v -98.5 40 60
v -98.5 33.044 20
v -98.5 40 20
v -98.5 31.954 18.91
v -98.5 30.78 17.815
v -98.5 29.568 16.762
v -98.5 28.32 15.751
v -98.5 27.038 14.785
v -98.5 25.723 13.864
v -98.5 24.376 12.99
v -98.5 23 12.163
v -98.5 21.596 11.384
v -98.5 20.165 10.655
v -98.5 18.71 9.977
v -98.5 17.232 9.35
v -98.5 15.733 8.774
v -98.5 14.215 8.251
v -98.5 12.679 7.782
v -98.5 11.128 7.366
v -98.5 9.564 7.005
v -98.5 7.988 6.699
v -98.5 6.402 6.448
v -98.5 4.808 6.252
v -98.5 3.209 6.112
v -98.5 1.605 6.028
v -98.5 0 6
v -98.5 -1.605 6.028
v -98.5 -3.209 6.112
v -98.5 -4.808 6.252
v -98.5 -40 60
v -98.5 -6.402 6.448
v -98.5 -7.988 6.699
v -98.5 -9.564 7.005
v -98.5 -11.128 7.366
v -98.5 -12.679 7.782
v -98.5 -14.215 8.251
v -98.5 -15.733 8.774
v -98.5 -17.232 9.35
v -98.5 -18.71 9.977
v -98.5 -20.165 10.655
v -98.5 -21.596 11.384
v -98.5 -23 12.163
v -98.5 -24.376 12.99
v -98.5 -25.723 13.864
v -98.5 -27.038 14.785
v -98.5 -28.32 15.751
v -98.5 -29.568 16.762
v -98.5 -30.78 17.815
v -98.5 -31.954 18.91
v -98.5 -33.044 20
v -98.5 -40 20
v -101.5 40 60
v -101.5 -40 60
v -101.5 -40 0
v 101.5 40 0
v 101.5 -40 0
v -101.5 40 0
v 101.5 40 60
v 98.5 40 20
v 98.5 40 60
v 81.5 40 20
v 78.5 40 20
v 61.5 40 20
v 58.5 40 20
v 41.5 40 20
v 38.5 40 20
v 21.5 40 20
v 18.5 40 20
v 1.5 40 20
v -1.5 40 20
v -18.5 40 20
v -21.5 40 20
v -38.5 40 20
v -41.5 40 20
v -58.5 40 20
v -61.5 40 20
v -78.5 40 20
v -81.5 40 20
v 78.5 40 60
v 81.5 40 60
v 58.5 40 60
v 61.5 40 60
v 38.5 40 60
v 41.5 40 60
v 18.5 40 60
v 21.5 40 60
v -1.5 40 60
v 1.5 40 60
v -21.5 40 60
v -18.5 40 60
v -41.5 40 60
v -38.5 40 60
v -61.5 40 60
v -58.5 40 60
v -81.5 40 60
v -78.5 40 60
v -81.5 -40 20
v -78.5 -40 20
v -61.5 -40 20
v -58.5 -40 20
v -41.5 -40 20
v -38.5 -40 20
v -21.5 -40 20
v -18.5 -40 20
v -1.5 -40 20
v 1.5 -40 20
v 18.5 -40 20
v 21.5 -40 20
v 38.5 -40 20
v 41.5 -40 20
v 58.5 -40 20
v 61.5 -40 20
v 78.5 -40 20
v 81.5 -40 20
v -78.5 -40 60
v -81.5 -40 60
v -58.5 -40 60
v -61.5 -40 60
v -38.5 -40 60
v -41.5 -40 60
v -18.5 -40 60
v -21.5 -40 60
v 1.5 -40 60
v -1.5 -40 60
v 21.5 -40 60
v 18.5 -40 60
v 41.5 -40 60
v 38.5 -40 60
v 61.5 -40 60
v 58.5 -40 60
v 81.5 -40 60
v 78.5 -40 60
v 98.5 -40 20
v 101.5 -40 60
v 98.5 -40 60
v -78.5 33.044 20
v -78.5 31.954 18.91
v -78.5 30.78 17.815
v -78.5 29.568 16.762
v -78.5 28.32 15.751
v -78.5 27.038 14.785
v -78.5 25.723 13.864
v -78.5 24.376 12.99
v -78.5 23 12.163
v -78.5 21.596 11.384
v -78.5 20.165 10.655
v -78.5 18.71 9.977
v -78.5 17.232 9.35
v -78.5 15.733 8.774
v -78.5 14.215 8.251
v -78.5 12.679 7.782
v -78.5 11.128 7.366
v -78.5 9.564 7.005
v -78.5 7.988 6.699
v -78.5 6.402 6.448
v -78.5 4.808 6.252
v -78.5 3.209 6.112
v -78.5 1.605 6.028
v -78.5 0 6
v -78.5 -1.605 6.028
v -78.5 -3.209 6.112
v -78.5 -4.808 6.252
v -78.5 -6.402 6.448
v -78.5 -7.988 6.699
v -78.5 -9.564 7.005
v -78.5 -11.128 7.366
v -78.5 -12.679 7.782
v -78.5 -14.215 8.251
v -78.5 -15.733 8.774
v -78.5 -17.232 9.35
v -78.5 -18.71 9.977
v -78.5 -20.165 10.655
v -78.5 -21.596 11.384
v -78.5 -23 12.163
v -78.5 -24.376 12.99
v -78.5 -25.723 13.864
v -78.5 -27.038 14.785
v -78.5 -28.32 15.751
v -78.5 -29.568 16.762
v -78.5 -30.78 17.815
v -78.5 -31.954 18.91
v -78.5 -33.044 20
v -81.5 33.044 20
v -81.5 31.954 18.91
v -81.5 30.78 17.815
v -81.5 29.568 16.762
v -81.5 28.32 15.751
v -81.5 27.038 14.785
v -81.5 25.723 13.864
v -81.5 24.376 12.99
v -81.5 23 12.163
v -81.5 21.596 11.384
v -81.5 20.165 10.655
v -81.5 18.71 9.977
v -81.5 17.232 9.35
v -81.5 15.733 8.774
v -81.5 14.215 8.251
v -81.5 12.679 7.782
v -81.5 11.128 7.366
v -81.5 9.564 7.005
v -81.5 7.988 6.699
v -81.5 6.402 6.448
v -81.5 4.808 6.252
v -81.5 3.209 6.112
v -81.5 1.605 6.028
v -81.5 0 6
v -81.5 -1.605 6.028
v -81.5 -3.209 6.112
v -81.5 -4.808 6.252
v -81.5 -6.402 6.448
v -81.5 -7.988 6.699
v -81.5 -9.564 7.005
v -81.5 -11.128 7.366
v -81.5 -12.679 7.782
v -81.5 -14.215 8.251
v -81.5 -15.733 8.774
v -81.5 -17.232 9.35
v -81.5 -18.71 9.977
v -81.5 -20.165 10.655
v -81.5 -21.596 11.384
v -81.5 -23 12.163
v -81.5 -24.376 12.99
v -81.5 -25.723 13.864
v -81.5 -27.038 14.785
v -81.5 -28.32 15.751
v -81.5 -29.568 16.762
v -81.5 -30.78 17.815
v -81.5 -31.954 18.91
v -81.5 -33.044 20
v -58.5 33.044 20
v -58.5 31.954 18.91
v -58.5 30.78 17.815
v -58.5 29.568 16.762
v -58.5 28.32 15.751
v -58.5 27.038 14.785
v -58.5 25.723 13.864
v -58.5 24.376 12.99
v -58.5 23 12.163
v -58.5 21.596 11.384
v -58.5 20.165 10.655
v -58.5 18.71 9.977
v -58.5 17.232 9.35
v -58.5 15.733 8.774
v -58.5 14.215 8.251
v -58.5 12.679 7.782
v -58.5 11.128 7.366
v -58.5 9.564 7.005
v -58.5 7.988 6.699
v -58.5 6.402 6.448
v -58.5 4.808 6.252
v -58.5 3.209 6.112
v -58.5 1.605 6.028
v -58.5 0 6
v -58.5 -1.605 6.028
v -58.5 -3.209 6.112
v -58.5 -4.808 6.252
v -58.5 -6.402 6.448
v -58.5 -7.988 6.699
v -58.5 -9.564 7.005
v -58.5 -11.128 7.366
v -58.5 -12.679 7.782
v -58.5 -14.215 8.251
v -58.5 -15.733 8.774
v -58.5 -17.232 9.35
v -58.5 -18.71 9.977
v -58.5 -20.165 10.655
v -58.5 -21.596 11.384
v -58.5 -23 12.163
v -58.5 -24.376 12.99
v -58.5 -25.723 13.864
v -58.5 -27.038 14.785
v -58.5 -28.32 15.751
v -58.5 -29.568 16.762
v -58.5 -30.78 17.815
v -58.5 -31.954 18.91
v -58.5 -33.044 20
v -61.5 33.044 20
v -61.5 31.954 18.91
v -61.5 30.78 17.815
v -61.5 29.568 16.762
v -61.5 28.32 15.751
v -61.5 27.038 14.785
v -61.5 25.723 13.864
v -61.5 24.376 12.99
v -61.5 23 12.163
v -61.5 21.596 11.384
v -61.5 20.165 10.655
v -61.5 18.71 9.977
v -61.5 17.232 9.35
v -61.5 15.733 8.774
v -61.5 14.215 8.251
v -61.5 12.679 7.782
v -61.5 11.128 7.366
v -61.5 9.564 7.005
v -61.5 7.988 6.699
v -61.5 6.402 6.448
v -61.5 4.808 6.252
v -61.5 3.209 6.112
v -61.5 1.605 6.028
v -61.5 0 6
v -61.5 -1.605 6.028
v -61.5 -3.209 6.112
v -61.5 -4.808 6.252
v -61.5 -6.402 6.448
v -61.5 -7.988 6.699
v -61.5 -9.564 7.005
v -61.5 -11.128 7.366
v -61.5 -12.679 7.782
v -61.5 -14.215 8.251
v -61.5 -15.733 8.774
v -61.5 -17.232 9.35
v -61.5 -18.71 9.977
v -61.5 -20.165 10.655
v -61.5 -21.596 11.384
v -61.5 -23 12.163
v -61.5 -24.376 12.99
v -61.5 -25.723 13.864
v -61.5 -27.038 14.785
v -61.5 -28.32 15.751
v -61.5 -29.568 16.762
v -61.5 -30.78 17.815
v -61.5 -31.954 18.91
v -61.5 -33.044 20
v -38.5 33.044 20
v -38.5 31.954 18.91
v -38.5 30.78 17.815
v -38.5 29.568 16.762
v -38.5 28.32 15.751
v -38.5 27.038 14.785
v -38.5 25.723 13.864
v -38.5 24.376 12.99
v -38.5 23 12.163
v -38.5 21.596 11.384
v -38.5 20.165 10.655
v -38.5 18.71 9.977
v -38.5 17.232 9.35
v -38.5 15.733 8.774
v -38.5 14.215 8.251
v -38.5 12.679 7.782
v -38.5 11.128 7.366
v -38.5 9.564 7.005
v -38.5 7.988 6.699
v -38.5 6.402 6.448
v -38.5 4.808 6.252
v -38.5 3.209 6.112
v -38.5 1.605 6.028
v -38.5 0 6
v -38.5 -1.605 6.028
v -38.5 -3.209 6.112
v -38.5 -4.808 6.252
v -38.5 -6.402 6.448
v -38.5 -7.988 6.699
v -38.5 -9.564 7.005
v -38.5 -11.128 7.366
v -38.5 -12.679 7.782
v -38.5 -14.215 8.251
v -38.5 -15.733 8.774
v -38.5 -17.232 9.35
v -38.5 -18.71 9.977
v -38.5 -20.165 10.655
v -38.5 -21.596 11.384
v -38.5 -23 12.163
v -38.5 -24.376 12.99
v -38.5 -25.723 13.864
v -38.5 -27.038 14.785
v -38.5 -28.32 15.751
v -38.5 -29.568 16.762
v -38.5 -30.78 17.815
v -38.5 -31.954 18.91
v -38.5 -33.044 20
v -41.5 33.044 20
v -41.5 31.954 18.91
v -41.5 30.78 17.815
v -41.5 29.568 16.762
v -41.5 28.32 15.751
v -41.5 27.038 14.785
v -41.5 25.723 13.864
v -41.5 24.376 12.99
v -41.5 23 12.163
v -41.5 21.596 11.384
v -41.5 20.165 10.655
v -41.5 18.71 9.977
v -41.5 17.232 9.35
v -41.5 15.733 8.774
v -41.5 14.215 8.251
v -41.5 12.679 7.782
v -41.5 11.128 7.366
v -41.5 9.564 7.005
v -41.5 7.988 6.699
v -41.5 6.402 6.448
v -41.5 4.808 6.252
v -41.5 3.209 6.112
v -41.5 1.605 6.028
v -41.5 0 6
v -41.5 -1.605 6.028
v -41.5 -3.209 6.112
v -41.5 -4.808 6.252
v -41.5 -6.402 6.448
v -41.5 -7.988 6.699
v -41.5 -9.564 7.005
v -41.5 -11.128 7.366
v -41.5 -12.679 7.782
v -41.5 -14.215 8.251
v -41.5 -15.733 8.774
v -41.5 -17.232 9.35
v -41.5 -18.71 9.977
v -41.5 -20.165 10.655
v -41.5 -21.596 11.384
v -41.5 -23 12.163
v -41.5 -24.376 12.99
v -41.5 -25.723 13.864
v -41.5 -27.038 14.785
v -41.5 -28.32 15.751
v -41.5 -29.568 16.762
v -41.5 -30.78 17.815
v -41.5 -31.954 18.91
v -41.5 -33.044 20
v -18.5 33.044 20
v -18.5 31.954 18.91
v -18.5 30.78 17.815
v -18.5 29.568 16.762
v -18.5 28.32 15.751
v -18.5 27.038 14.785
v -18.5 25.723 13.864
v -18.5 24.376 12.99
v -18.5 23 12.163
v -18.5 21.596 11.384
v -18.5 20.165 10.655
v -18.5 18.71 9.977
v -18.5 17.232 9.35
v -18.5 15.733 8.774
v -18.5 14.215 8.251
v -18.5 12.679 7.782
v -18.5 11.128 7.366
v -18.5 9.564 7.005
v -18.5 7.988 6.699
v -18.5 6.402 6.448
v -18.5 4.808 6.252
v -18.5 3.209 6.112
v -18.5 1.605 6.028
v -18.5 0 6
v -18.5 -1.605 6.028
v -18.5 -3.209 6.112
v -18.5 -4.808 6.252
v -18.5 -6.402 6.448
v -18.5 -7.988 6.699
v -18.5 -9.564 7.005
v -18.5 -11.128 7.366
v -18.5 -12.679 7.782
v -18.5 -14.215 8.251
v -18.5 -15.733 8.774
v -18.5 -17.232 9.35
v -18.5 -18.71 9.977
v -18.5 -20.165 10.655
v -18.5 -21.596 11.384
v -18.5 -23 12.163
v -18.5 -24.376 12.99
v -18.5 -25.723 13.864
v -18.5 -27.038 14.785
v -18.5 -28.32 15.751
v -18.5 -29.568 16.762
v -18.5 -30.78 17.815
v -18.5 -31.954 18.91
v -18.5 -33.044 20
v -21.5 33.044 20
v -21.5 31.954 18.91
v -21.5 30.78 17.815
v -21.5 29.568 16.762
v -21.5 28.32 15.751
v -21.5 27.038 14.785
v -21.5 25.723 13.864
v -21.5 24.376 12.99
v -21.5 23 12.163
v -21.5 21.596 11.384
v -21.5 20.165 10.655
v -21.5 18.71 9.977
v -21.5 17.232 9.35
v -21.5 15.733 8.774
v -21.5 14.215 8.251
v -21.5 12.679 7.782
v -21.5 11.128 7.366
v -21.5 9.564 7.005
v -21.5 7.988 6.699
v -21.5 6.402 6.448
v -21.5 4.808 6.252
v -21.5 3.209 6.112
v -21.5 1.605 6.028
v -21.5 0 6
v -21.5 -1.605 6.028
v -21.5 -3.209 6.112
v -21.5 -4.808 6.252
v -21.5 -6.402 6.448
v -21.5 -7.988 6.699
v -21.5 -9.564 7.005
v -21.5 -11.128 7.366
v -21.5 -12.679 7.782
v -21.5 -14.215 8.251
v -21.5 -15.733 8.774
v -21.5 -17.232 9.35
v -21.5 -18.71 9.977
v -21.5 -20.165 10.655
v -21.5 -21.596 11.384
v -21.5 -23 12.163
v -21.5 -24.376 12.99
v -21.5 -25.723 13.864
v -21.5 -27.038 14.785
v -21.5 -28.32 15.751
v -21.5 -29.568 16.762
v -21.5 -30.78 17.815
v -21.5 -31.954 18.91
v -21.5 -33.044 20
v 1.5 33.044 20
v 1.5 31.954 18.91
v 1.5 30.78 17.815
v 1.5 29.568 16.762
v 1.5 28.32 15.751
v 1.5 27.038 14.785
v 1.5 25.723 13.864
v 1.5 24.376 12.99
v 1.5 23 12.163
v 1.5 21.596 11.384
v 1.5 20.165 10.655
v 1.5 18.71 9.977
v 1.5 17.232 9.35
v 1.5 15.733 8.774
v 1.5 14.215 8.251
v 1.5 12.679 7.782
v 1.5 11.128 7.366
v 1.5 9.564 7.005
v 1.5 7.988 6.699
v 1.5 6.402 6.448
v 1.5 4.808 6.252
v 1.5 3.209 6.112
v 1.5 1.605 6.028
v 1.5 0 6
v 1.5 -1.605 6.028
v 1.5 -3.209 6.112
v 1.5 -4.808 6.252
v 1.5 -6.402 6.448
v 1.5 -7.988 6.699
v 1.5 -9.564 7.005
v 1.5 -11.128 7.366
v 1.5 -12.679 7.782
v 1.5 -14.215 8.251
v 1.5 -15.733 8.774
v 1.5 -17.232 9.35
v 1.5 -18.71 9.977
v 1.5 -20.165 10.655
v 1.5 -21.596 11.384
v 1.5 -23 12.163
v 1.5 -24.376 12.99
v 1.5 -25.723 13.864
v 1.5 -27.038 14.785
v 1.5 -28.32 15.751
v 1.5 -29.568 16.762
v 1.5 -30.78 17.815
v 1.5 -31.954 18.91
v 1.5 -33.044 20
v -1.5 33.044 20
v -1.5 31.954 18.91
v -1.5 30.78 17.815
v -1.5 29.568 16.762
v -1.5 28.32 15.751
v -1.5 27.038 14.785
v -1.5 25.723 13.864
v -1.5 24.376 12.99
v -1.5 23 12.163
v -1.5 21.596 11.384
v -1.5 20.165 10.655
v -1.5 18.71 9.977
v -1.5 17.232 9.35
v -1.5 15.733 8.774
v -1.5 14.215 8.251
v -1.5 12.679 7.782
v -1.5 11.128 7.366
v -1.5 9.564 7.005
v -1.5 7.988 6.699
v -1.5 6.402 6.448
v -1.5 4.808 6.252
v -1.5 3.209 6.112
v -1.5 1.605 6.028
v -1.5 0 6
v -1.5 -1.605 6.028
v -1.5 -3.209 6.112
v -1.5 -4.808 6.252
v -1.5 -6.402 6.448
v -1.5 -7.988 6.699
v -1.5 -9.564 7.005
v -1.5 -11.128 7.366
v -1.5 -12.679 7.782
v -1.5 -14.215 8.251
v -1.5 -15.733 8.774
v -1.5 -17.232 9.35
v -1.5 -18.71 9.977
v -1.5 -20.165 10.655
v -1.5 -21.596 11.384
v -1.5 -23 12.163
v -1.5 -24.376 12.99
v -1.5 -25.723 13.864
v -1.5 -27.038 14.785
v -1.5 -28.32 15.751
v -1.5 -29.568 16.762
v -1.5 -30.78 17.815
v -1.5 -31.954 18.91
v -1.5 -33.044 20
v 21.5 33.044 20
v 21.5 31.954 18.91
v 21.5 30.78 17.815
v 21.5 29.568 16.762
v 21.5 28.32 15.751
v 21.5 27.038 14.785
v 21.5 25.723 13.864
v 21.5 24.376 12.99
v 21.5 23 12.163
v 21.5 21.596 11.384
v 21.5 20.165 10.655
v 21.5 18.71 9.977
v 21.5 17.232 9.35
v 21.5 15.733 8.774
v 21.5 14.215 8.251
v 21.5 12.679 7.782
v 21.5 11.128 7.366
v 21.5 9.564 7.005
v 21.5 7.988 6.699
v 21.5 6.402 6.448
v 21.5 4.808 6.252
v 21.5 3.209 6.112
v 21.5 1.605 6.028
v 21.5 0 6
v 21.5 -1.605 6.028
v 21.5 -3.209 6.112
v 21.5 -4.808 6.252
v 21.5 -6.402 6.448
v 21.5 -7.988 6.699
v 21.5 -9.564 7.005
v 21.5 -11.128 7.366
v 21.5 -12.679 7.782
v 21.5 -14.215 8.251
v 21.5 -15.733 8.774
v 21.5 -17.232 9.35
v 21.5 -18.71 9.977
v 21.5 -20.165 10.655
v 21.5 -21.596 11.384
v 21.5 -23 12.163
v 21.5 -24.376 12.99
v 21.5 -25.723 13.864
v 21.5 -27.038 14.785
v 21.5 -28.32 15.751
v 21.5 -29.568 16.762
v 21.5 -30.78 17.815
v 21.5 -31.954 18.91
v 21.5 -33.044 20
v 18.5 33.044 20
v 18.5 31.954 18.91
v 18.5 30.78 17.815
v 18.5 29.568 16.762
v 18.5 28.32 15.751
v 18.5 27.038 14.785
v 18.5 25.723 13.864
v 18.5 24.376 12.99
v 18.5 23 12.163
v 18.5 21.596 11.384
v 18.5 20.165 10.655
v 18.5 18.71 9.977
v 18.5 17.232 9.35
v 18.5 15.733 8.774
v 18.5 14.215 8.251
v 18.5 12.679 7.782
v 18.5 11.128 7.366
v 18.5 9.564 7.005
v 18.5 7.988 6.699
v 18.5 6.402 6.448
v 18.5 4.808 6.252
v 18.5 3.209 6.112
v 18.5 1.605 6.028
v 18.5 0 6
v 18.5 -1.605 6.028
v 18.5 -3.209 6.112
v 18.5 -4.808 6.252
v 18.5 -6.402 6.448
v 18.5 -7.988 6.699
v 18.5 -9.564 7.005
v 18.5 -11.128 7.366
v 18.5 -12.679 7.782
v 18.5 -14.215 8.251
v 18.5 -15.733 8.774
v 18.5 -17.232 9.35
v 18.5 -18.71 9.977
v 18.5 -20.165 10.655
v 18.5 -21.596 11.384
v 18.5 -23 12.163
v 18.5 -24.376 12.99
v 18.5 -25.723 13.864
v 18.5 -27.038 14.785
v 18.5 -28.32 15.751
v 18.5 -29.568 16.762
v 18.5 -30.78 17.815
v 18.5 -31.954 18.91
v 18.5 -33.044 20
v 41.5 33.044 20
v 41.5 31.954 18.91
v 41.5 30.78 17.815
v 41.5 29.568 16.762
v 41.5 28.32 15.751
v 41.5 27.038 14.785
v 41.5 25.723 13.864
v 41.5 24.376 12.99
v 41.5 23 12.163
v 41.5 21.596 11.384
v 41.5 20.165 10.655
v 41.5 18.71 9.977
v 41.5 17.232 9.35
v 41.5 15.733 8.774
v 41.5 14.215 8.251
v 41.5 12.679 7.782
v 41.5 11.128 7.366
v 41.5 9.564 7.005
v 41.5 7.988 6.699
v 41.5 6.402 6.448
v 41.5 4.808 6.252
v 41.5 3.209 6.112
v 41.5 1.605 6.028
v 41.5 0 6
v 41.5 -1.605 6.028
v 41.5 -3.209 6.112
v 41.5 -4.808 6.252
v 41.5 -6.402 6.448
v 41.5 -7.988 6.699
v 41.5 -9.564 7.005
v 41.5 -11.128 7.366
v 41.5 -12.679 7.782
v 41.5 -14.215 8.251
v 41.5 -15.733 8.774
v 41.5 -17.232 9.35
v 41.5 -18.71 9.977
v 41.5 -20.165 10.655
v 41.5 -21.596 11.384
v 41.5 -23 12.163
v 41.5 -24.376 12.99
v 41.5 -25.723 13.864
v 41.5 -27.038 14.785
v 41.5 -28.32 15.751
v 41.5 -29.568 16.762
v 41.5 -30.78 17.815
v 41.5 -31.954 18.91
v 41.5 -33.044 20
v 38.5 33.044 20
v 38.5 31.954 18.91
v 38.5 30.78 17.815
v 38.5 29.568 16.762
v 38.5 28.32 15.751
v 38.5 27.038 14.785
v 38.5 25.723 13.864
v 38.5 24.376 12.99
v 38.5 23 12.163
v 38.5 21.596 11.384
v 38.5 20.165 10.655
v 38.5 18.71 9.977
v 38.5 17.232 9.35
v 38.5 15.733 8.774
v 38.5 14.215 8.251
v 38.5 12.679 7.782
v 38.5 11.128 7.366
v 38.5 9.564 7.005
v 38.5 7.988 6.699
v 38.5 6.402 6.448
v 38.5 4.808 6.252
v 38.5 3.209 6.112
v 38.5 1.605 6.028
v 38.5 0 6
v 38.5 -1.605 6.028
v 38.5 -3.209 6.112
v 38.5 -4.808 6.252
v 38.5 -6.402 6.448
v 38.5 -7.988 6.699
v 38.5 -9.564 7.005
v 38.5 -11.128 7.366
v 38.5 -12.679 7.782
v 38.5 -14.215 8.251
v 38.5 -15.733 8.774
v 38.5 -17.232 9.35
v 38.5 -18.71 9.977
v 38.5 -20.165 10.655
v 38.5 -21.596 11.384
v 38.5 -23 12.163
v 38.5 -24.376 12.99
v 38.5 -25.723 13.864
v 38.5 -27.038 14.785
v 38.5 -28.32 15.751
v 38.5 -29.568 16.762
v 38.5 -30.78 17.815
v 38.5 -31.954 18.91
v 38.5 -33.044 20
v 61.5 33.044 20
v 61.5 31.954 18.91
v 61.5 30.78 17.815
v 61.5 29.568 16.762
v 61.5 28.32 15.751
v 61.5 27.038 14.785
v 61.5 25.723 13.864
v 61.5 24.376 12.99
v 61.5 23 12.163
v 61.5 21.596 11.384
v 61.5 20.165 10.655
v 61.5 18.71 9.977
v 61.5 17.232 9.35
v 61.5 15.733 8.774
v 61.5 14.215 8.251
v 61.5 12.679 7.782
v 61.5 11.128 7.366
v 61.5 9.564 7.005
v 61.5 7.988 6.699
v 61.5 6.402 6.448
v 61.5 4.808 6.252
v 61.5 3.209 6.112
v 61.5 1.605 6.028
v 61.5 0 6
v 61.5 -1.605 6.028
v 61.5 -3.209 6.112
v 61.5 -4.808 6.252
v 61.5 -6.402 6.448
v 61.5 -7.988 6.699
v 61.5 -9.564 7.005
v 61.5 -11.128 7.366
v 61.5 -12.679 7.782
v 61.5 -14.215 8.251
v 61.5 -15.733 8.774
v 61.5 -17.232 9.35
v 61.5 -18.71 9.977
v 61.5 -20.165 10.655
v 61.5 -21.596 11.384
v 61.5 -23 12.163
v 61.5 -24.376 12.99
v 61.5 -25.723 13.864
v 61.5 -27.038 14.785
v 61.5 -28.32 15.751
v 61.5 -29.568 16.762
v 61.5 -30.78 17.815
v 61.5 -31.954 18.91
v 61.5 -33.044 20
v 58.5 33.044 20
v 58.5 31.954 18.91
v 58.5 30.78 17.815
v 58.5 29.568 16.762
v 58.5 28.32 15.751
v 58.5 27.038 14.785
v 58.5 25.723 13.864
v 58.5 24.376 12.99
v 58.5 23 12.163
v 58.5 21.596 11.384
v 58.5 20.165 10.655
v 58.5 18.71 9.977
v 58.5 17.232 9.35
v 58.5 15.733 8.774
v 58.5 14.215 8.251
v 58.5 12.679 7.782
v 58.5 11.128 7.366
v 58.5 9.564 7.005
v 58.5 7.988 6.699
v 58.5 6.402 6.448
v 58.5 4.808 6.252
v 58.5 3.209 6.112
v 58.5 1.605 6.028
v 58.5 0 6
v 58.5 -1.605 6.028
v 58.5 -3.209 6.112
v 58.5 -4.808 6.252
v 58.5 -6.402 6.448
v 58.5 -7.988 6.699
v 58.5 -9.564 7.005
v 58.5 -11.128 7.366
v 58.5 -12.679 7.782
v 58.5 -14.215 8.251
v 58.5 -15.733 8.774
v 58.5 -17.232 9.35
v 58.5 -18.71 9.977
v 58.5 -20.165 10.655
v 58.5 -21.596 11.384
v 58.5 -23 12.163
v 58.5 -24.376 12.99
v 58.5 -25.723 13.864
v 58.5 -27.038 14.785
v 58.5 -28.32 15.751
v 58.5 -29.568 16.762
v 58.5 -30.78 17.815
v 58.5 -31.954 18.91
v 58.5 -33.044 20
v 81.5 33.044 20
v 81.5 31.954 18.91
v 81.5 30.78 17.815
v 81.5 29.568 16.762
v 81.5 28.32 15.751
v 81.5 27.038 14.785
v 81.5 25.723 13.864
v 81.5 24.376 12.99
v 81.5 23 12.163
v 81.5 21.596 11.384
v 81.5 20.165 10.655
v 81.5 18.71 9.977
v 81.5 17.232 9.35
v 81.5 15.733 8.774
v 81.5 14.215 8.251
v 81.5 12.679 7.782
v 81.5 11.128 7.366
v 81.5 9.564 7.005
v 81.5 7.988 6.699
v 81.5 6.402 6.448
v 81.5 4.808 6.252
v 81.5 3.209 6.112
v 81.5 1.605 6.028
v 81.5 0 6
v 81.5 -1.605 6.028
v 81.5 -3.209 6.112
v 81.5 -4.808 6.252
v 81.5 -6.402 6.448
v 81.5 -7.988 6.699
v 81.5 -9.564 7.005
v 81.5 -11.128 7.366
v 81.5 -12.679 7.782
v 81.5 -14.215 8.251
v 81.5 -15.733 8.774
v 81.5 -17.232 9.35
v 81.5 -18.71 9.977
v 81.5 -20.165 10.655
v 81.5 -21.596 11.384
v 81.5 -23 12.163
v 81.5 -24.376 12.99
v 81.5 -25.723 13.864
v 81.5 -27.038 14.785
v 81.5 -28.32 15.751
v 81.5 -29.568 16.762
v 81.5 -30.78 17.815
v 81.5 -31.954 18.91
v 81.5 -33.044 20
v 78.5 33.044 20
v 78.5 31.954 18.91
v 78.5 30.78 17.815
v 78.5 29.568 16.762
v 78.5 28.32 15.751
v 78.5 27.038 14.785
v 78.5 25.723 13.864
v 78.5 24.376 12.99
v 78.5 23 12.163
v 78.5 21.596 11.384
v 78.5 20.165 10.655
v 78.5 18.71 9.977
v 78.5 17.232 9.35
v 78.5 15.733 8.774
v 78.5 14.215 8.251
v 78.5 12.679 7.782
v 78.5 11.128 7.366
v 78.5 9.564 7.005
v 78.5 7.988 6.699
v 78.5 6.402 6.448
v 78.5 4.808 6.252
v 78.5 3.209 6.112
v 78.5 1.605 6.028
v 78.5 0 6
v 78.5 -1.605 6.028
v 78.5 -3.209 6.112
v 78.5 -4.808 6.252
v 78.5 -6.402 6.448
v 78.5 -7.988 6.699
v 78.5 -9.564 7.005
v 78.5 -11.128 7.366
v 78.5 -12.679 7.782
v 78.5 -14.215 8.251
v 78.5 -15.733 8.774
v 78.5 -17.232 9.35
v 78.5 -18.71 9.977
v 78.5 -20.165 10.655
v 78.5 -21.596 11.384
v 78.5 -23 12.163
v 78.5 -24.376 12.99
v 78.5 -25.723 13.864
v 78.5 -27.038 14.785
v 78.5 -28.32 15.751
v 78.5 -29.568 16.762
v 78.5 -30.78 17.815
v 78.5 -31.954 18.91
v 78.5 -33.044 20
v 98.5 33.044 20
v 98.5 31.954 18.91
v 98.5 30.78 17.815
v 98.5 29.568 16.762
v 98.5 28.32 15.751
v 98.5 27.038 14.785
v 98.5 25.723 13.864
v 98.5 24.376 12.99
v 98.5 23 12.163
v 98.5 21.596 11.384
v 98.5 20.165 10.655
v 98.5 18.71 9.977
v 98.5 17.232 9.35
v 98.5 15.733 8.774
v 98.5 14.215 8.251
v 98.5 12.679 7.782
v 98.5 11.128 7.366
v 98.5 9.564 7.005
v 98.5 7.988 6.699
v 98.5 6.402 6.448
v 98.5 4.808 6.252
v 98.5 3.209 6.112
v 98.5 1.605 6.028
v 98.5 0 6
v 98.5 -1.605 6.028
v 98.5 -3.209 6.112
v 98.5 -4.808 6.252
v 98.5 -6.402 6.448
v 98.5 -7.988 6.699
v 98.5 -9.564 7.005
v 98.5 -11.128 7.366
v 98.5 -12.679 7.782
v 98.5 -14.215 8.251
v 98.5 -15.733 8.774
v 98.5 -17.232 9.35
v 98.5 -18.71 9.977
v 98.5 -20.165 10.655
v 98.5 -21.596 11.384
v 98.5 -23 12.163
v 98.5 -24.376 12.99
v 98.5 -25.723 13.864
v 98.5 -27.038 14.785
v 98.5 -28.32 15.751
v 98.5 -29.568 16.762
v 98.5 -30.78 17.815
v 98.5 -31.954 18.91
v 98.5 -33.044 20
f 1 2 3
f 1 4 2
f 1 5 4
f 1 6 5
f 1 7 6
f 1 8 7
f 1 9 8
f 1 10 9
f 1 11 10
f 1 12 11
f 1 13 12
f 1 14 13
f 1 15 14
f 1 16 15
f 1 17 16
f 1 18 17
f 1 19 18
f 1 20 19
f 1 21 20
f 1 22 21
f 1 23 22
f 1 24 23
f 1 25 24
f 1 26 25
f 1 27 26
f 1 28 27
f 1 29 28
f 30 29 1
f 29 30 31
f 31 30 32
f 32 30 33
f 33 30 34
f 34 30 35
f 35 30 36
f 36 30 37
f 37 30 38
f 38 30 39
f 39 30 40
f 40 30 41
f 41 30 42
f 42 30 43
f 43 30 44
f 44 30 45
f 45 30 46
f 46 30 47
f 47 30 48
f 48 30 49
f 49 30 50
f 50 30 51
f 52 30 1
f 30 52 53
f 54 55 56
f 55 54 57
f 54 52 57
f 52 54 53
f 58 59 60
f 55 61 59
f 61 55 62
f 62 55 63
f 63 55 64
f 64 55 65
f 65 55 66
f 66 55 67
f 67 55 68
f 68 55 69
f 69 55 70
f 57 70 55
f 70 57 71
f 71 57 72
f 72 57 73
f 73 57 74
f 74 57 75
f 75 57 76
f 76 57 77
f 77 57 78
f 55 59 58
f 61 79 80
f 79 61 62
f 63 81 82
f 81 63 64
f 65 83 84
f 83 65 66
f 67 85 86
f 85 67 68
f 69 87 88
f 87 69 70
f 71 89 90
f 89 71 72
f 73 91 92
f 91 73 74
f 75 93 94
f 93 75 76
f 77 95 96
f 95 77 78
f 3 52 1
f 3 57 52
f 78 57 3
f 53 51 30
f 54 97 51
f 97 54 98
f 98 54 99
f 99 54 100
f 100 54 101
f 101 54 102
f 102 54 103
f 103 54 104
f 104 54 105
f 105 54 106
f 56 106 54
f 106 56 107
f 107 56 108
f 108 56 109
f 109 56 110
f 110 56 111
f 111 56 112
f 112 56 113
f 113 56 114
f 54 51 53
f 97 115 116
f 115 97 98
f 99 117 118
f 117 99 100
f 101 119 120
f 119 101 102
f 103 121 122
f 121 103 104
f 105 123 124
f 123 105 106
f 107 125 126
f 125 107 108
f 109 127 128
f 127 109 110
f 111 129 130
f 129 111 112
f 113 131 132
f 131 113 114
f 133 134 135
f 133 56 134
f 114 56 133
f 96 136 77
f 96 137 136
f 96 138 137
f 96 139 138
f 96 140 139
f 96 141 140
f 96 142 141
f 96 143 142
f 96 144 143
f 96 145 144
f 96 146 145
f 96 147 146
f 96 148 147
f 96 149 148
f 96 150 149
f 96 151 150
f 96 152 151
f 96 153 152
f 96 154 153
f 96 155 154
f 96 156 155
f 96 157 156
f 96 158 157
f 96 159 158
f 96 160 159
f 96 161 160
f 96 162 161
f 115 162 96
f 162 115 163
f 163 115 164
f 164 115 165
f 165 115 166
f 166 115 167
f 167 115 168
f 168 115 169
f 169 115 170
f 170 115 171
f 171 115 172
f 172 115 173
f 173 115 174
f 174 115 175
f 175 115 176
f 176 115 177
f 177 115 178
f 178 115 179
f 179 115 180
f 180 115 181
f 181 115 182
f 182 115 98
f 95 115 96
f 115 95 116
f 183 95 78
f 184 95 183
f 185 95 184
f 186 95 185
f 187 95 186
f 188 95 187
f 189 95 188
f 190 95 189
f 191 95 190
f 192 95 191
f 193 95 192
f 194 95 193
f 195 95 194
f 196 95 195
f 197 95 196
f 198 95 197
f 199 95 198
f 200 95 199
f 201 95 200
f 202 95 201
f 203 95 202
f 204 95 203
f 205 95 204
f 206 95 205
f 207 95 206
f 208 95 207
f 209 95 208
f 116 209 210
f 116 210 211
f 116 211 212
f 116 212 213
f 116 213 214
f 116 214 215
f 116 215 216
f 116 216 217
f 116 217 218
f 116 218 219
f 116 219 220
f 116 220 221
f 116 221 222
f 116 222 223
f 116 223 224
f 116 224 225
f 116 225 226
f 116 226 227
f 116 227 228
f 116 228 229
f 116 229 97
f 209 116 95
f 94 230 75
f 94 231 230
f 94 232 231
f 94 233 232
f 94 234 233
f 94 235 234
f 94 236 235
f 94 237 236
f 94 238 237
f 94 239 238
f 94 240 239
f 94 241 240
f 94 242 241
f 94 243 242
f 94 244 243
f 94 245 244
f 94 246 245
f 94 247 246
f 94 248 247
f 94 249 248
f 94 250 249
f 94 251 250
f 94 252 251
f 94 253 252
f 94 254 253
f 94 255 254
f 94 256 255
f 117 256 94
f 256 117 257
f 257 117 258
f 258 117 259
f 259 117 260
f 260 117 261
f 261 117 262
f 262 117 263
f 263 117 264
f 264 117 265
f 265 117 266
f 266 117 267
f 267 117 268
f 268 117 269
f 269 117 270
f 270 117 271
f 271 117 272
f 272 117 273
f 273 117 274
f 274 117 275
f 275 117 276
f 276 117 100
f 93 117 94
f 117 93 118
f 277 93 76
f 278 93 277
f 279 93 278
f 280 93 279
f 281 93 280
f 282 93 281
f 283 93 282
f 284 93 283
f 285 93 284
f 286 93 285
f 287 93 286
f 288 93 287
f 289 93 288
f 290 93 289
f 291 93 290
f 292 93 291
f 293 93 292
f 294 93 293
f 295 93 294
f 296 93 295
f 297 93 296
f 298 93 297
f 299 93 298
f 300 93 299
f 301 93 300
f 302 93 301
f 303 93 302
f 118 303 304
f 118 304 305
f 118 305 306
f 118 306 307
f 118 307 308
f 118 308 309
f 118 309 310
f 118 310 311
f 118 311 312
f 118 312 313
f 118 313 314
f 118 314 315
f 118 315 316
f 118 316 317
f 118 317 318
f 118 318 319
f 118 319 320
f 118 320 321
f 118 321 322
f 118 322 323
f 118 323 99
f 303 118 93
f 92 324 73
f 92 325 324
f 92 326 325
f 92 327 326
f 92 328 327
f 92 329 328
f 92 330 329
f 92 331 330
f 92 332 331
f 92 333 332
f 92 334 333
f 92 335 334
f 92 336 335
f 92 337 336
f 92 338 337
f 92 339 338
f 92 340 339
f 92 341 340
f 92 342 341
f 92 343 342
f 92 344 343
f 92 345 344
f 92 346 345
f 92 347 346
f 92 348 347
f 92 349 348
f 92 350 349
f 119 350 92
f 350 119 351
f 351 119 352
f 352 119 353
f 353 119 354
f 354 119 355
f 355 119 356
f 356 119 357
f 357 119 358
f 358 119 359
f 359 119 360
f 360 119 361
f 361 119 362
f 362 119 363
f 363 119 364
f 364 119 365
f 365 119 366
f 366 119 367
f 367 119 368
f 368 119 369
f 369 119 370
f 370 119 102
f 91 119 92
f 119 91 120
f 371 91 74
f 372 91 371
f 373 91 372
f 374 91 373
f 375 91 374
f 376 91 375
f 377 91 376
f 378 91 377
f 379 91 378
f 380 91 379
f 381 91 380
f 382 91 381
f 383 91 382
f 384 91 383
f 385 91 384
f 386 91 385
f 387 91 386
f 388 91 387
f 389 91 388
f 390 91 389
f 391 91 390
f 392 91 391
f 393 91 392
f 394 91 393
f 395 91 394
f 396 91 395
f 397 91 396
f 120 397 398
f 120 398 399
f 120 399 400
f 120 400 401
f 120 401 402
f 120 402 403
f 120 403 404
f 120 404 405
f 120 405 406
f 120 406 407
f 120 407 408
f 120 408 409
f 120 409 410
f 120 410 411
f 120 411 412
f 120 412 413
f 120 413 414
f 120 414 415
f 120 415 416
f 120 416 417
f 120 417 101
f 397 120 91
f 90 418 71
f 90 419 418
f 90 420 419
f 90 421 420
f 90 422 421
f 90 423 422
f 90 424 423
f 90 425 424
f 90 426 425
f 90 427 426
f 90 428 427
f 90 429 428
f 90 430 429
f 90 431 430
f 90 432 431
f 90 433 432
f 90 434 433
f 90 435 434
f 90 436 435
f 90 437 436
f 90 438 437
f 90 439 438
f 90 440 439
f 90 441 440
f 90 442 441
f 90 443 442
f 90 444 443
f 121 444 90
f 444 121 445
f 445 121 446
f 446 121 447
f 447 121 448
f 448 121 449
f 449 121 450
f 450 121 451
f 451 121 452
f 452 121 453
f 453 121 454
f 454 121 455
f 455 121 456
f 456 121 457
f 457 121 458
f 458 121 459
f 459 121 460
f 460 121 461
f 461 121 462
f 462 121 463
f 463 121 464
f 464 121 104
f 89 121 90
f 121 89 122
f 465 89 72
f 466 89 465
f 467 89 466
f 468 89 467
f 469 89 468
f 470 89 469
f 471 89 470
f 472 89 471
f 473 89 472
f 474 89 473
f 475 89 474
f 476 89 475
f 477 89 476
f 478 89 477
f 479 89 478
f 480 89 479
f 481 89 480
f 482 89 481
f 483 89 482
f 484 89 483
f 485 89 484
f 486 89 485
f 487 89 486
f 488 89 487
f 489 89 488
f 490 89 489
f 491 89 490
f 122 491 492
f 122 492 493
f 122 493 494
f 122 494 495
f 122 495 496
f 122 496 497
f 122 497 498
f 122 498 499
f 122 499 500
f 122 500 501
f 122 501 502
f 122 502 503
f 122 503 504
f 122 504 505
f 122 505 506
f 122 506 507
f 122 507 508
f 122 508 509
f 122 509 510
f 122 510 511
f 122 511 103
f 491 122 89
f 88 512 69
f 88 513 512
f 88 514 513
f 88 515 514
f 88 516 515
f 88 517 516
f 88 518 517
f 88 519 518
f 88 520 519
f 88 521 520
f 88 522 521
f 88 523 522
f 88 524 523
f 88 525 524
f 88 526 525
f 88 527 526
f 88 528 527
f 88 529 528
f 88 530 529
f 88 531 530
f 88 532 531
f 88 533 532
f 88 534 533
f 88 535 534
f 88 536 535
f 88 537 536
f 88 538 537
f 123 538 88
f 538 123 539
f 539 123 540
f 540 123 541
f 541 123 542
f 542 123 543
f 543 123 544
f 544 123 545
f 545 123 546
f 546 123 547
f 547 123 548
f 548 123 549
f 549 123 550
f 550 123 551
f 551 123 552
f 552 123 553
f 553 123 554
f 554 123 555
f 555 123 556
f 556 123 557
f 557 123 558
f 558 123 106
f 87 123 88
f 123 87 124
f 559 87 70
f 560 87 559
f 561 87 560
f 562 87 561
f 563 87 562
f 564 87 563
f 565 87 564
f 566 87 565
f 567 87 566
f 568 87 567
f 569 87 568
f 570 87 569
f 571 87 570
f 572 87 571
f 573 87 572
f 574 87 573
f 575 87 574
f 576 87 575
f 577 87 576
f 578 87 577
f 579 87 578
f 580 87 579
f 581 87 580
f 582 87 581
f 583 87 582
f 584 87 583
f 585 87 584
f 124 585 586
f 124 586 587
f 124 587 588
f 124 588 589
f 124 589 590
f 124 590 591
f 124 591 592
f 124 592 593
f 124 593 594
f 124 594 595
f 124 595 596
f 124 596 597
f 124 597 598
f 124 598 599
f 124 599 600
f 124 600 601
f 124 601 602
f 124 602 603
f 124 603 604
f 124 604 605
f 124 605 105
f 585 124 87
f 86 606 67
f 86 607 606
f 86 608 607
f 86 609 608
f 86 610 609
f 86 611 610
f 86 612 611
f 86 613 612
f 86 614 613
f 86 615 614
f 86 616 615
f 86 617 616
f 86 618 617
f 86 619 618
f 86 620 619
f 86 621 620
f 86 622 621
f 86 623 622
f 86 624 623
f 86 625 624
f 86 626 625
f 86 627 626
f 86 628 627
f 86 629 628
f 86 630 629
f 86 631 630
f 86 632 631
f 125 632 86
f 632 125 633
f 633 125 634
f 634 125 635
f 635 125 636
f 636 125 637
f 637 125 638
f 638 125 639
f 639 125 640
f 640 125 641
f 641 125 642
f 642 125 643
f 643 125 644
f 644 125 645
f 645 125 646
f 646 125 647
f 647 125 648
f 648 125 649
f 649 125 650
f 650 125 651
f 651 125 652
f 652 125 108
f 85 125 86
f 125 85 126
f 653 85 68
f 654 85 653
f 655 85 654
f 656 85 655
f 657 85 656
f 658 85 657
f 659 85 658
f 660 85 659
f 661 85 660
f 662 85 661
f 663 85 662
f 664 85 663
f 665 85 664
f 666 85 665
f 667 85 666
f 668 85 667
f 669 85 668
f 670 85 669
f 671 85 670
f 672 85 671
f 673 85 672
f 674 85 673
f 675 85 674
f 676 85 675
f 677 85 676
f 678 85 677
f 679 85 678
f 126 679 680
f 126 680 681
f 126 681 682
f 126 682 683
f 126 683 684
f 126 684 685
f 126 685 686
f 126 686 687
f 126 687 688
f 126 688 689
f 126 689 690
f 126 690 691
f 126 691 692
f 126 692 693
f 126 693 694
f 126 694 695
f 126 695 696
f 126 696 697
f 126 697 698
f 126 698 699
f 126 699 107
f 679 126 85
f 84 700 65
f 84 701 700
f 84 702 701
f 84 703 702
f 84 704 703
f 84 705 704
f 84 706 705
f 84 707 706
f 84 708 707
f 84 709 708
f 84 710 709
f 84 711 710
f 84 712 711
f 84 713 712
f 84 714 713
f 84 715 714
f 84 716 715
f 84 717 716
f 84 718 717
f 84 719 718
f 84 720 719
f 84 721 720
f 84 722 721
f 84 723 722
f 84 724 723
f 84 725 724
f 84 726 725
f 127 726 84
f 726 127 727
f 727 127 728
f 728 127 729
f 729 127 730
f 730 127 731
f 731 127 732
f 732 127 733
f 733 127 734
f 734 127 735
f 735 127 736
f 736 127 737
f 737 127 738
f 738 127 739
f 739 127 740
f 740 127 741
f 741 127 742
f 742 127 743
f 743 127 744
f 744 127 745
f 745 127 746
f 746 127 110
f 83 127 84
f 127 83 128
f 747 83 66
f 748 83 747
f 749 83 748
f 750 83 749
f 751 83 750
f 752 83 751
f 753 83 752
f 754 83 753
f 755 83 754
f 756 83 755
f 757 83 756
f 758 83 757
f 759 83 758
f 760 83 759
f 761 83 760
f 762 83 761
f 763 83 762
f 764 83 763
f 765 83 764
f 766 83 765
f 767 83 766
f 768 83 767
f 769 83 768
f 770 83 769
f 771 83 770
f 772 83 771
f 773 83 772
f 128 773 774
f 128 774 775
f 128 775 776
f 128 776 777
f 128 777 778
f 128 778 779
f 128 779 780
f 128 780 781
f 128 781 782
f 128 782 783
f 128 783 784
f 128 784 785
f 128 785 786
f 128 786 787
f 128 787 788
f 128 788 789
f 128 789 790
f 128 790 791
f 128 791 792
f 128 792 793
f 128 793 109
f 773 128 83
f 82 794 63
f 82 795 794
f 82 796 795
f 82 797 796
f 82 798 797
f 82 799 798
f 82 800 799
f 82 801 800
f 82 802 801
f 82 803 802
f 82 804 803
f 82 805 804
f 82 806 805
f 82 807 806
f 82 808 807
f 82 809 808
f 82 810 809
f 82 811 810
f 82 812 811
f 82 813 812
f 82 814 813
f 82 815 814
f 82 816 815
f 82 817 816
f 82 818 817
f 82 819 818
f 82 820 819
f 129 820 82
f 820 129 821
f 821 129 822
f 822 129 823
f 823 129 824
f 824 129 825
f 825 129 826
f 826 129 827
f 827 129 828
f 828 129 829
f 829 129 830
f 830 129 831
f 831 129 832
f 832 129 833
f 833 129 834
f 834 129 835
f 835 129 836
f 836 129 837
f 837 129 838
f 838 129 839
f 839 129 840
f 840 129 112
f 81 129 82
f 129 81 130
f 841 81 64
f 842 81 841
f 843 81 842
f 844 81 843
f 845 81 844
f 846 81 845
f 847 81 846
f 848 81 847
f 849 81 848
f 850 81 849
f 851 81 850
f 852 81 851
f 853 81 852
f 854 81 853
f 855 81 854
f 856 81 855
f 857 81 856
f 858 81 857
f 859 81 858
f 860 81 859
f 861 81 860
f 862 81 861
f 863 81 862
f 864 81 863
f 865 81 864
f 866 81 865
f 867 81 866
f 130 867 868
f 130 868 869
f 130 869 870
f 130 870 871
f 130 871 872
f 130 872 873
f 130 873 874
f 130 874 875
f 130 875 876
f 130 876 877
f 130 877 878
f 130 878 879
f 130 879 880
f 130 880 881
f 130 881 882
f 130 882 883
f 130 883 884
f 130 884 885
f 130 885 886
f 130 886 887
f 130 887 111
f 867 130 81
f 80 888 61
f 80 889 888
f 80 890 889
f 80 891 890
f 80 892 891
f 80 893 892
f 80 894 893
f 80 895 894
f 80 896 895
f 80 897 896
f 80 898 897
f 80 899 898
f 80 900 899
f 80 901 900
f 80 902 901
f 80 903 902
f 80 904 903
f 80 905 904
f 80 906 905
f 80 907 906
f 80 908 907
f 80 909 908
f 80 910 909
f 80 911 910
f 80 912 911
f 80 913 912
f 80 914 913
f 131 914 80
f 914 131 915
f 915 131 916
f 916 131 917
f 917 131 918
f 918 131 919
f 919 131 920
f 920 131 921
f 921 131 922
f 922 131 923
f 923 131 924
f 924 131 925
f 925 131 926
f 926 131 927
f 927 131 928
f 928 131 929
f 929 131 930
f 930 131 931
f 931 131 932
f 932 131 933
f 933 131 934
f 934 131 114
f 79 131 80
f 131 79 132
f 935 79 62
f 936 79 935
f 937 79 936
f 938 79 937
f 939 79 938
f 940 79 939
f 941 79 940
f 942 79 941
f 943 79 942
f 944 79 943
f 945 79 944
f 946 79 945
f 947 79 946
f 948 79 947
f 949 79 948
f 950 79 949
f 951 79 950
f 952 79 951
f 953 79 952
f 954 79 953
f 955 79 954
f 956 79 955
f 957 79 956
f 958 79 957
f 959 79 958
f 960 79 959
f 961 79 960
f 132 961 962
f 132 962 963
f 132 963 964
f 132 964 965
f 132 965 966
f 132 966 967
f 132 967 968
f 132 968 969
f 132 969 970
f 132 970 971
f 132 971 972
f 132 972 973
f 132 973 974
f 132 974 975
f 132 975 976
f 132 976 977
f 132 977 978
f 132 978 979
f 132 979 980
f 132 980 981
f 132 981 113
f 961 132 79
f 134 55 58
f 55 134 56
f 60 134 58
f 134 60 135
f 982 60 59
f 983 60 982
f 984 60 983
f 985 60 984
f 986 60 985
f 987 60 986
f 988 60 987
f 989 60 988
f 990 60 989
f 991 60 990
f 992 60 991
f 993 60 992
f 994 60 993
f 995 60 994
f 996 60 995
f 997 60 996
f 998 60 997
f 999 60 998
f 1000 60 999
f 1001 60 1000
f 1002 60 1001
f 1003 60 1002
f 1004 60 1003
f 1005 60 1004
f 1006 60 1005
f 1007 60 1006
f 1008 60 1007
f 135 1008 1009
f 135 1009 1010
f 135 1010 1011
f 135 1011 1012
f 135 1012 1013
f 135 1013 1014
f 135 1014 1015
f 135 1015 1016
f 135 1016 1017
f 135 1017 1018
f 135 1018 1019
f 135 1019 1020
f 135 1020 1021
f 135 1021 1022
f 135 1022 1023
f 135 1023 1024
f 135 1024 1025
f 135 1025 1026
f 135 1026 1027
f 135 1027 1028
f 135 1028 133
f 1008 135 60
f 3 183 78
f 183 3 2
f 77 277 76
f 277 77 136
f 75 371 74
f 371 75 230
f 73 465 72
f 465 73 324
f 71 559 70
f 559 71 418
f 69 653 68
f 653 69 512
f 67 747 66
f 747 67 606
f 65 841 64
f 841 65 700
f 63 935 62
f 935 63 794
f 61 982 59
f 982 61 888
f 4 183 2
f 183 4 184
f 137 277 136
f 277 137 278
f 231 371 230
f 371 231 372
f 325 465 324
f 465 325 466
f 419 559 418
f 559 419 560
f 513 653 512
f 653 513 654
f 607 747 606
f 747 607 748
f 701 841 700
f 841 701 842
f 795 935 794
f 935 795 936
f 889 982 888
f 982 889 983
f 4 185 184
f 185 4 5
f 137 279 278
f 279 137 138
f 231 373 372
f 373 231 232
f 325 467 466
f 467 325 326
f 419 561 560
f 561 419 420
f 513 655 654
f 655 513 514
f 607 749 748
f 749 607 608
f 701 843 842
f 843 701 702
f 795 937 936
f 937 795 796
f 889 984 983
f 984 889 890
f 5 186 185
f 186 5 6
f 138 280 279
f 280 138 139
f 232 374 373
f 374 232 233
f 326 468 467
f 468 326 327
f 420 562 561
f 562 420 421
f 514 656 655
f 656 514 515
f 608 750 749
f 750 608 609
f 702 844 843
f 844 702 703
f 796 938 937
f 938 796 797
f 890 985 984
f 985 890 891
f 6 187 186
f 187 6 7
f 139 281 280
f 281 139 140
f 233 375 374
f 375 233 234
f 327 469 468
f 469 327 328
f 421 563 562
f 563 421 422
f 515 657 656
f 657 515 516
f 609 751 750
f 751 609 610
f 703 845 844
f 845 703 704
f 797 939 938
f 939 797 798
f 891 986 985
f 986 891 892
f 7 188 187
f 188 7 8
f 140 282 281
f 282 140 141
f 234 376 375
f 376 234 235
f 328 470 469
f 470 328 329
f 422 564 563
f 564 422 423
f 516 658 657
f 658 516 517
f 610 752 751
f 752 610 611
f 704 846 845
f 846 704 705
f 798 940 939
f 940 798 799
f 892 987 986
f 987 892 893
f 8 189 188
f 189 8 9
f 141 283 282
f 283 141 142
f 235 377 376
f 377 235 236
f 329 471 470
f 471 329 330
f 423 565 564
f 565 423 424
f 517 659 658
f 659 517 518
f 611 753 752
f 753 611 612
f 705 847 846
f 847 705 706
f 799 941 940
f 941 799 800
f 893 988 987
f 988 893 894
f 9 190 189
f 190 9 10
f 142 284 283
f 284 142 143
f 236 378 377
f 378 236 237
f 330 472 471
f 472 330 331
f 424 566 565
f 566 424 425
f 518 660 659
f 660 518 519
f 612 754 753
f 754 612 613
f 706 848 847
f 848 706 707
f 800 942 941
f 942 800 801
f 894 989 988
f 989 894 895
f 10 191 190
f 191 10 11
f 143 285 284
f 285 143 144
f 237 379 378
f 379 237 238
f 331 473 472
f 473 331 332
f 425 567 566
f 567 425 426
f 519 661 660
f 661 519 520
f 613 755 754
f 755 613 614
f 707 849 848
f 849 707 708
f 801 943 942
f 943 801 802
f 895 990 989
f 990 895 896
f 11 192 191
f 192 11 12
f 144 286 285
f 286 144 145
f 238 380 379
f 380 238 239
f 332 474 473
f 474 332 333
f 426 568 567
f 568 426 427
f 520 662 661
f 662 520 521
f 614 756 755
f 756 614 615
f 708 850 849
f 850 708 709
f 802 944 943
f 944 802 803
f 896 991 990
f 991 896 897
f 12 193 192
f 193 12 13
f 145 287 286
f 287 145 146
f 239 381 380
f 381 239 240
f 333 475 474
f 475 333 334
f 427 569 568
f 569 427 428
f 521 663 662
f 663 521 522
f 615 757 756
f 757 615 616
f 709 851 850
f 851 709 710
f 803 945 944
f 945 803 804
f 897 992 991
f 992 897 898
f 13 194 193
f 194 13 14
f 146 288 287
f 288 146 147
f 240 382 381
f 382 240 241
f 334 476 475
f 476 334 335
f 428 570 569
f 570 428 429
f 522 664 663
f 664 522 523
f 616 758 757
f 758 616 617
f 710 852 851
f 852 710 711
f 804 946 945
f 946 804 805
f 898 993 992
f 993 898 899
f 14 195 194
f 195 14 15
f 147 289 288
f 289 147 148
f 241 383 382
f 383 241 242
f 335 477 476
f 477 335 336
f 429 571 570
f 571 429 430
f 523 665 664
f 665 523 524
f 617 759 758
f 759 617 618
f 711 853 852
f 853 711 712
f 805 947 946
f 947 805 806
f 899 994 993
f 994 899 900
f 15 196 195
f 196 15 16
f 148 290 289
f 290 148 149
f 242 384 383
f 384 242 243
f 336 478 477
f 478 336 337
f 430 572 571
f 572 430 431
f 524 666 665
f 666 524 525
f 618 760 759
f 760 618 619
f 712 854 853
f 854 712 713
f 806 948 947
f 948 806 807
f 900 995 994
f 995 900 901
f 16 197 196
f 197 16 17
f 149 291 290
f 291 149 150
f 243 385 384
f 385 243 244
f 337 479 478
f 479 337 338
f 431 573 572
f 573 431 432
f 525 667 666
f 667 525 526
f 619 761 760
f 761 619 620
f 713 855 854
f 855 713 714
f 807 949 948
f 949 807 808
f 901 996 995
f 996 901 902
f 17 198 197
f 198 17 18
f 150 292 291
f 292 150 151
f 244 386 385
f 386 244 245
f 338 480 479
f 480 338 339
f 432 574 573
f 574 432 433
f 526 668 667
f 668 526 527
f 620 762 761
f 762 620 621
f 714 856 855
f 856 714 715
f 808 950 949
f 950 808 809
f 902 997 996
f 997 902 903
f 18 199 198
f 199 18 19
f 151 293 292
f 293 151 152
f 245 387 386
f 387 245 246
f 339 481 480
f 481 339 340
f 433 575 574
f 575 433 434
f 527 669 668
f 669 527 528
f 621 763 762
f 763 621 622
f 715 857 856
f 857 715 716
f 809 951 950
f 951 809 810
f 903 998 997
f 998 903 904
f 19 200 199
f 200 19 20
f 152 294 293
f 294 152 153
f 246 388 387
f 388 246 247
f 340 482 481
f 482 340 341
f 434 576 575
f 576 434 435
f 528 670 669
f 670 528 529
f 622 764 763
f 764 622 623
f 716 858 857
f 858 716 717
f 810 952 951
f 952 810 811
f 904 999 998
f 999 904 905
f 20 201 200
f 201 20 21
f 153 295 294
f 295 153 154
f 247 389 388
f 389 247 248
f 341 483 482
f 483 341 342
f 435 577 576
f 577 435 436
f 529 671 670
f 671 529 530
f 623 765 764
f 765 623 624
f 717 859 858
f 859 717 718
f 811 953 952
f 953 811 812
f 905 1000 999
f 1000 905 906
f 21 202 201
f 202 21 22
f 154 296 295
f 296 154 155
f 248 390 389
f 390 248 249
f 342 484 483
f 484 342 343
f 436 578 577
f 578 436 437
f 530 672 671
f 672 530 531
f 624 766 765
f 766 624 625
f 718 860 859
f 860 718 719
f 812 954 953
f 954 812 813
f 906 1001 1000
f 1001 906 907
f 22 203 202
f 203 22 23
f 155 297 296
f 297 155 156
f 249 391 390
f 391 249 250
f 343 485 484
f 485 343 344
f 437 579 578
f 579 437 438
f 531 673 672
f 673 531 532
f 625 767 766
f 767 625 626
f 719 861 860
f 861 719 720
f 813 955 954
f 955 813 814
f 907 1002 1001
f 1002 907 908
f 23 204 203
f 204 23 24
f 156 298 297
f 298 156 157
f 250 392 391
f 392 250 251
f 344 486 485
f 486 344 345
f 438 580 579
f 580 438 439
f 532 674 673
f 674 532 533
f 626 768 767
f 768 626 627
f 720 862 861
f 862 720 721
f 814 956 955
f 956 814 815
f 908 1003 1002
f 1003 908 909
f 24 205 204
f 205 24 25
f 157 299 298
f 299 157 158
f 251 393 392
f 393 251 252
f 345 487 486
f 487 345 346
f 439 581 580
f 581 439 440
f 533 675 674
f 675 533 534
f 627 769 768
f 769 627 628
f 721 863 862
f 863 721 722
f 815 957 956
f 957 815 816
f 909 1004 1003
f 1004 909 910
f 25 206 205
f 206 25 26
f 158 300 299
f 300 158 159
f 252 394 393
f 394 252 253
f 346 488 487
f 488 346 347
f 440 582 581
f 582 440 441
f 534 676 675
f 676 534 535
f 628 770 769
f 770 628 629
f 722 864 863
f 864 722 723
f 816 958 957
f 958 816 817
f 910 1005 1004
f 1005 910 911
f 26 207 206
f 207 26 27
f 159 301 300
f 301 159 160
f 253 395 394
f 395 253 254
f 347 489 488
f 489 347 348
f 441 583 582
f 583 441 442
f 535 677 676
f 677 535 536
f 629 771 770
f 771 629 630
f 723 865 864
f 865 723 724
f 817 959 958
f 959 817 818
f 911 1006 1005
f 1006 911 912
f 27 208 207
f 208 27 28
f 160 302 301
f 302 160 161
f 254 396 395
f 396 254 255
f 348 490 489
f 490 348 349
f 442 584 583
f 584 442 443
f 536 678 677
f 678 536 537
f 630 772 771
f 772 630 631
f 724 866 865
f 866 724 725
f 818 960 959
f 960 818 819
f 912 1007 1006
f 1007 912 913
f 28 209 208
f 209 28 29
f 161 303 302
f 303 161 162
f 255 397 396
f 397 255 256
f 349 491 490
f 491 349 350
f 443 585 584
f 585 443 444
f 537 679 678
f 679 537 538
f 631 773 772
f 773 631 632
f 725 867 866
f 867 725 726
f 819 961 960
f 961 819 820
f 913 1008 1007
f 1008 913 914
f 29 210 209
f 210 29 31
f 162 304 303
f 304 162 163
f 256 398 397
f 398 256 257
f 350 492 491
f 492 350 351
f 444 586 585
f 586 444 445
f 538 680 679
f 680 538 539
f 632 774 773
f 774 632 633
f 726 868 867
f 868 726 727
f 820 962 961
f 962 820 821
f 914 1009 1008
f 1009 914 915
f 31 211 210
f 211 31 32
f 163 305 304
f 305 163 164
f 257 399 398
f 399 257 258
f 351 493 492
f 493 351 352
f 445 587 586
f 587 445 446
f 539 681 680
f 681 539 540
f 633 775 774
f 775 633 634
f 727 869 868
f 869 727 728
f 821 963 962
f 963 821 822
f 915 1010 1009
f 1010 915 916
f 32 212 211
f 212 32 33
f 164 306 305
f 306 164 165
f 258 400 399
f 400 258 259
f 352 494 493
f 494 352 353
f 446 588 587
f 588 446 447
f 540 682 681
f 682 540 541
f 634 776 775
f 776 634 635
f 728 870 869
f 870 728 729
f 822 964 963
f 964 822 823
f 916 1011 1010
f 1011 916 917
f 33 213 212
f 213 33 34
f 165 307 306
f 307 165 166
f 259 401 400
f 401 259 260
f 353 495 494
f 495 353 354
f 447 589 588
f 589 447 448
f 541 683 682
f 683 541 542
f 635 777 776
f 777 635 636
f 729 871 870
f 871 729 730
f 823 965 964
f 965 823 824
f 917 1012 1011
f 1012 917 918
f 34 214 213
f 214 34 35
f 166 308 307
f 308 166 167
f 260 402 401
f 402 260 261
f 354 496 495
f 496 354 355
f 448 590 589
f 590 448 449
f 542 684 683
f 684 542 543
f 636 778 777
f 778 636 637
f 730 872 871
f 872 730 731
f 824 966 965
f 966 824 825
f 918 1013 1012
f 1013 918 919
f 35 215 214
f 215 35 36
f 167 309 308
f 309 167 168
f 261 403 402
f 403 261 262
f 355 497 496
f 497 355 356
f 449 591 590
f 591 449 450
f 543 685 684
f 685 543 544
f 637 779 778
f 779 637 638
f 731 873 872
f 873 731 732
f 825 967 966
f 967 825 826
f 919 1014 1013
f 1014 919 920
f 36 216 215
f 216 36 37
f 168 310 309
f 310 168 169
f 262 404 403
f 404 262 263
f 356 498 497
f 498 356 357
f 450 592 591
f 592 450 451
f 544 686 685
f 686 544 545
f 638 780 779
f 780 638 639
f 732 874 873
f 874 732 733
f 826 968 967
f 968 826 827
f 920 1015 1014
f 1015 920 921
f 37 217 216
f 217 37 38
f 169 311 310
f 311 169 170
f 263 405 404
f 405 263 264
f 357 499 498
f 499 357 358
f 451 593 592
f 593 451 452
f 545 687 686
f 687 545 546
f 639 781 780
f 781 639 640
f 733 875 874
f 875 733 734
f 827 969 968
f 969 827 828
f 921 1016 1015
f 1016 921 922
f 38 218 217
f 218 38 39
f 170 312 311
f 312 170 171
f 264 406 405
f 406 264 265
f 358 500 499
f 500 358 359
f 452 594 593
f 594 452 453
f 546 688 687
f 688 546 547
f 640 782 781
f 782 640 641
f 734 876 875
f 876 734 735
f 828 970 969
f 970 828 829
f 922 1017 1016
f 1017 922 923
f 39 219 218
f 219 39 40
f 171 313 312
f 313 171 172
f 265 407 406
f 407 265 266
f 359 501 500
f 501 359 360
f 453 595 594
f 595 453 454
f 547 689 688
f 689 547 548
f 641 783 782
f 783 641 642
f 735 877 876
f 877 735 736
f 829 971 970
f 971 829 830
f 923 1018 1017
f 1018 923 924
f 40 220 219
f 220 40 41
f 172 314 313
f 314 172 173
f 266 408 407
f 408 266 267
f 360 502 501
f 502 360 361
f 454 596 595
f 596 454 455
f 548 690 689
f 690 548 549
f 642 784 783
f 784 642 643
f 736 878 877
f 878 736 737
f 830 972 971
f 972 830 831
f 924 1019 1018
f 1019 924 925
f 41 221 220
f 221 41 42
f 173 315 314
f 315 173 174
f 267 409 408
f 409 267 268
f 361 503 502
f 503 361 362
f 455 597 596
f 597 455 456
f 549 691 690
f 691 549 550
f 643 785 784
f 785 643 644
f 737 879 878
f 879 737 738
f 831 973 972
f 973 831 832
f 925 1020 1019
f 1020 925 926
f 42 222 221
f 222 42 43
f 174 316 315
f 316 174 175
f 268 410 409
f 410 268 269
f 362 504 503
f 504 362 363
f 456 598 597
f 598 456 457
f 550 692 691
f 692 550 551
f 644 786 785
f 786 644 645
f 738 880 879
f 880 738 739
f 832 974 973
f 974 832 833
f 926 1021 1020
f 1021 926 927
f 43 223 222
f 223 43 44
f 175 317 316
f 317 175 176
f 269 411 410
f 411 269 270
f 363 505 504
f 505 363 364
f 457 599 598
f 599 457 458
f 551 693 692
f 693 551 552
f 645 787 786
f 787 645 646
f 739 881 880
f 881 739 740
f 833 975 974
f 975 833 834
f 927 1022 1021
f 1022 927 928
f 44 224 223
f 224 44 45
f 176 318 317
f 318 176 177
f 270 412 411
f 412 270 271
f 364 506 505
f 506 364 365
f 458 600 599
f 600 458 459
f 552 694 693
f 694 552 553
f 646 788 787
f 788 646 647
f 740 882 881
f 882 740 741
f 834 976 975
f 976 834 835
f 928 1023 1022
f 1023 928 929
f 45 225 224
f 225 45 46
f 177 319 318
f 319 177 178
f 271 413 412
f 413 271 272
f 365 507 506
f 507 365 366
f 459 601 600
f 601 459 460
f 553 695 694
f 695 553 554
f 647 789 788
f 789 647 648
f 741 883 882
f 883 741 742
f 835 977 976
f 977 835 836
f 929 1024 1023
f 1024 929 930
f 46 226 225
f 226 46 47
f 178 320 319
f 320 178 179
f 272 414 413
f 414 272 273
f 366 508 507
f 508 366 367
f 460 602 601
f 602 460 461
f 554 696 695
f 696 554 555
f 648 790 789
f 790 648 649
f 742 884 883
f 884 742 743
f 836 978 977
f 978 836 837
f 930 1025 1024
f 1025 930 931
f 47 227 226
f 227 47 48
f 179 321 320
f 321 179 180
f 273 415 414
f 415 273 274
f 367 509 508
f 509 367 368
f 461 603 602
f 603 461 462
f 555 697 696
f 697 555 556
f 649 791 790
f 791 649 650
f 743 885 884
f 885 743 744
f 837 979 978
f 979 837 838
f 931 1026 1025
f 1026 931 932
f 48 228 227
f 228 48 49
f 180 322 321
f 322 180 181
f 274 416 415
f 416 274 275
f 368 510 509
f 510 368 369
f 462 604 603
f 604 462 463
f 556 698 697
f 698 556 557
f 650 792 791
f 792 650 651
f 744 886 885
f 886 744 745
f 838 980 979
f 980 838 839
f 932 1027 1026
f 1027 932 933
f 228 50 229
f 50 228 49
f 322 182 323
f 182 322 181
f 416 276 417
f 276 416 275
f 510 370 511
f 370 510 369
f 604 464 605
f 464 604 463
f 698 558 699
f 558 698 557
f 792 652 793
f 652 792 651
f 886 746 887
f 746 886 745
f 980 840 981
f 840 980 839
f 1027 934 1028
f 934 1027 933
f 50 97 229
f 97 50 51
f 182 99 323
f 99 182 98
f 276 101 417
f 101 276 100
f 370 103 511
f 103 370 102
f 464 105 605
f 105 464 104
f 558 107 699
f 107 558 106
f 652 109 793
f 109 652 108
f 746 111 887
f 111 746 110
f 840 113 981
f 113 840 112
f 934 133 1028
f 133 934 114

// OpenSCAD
// KNOWN-RIGHT ALTERNATIVE (must pass): a correct part coded independently, the base as an extruded end profile
rotate([90,0,90]) translate([0,0,-101.5]) linear_extrude(203) difference(){ translate([-40,0]) square([80,20]); translate([0,52]) circle(r=46,$fn=180); }
for(i=[0:10]) translate([-100+20*i-1.5,-40,0]) cube([3,80,60]);
